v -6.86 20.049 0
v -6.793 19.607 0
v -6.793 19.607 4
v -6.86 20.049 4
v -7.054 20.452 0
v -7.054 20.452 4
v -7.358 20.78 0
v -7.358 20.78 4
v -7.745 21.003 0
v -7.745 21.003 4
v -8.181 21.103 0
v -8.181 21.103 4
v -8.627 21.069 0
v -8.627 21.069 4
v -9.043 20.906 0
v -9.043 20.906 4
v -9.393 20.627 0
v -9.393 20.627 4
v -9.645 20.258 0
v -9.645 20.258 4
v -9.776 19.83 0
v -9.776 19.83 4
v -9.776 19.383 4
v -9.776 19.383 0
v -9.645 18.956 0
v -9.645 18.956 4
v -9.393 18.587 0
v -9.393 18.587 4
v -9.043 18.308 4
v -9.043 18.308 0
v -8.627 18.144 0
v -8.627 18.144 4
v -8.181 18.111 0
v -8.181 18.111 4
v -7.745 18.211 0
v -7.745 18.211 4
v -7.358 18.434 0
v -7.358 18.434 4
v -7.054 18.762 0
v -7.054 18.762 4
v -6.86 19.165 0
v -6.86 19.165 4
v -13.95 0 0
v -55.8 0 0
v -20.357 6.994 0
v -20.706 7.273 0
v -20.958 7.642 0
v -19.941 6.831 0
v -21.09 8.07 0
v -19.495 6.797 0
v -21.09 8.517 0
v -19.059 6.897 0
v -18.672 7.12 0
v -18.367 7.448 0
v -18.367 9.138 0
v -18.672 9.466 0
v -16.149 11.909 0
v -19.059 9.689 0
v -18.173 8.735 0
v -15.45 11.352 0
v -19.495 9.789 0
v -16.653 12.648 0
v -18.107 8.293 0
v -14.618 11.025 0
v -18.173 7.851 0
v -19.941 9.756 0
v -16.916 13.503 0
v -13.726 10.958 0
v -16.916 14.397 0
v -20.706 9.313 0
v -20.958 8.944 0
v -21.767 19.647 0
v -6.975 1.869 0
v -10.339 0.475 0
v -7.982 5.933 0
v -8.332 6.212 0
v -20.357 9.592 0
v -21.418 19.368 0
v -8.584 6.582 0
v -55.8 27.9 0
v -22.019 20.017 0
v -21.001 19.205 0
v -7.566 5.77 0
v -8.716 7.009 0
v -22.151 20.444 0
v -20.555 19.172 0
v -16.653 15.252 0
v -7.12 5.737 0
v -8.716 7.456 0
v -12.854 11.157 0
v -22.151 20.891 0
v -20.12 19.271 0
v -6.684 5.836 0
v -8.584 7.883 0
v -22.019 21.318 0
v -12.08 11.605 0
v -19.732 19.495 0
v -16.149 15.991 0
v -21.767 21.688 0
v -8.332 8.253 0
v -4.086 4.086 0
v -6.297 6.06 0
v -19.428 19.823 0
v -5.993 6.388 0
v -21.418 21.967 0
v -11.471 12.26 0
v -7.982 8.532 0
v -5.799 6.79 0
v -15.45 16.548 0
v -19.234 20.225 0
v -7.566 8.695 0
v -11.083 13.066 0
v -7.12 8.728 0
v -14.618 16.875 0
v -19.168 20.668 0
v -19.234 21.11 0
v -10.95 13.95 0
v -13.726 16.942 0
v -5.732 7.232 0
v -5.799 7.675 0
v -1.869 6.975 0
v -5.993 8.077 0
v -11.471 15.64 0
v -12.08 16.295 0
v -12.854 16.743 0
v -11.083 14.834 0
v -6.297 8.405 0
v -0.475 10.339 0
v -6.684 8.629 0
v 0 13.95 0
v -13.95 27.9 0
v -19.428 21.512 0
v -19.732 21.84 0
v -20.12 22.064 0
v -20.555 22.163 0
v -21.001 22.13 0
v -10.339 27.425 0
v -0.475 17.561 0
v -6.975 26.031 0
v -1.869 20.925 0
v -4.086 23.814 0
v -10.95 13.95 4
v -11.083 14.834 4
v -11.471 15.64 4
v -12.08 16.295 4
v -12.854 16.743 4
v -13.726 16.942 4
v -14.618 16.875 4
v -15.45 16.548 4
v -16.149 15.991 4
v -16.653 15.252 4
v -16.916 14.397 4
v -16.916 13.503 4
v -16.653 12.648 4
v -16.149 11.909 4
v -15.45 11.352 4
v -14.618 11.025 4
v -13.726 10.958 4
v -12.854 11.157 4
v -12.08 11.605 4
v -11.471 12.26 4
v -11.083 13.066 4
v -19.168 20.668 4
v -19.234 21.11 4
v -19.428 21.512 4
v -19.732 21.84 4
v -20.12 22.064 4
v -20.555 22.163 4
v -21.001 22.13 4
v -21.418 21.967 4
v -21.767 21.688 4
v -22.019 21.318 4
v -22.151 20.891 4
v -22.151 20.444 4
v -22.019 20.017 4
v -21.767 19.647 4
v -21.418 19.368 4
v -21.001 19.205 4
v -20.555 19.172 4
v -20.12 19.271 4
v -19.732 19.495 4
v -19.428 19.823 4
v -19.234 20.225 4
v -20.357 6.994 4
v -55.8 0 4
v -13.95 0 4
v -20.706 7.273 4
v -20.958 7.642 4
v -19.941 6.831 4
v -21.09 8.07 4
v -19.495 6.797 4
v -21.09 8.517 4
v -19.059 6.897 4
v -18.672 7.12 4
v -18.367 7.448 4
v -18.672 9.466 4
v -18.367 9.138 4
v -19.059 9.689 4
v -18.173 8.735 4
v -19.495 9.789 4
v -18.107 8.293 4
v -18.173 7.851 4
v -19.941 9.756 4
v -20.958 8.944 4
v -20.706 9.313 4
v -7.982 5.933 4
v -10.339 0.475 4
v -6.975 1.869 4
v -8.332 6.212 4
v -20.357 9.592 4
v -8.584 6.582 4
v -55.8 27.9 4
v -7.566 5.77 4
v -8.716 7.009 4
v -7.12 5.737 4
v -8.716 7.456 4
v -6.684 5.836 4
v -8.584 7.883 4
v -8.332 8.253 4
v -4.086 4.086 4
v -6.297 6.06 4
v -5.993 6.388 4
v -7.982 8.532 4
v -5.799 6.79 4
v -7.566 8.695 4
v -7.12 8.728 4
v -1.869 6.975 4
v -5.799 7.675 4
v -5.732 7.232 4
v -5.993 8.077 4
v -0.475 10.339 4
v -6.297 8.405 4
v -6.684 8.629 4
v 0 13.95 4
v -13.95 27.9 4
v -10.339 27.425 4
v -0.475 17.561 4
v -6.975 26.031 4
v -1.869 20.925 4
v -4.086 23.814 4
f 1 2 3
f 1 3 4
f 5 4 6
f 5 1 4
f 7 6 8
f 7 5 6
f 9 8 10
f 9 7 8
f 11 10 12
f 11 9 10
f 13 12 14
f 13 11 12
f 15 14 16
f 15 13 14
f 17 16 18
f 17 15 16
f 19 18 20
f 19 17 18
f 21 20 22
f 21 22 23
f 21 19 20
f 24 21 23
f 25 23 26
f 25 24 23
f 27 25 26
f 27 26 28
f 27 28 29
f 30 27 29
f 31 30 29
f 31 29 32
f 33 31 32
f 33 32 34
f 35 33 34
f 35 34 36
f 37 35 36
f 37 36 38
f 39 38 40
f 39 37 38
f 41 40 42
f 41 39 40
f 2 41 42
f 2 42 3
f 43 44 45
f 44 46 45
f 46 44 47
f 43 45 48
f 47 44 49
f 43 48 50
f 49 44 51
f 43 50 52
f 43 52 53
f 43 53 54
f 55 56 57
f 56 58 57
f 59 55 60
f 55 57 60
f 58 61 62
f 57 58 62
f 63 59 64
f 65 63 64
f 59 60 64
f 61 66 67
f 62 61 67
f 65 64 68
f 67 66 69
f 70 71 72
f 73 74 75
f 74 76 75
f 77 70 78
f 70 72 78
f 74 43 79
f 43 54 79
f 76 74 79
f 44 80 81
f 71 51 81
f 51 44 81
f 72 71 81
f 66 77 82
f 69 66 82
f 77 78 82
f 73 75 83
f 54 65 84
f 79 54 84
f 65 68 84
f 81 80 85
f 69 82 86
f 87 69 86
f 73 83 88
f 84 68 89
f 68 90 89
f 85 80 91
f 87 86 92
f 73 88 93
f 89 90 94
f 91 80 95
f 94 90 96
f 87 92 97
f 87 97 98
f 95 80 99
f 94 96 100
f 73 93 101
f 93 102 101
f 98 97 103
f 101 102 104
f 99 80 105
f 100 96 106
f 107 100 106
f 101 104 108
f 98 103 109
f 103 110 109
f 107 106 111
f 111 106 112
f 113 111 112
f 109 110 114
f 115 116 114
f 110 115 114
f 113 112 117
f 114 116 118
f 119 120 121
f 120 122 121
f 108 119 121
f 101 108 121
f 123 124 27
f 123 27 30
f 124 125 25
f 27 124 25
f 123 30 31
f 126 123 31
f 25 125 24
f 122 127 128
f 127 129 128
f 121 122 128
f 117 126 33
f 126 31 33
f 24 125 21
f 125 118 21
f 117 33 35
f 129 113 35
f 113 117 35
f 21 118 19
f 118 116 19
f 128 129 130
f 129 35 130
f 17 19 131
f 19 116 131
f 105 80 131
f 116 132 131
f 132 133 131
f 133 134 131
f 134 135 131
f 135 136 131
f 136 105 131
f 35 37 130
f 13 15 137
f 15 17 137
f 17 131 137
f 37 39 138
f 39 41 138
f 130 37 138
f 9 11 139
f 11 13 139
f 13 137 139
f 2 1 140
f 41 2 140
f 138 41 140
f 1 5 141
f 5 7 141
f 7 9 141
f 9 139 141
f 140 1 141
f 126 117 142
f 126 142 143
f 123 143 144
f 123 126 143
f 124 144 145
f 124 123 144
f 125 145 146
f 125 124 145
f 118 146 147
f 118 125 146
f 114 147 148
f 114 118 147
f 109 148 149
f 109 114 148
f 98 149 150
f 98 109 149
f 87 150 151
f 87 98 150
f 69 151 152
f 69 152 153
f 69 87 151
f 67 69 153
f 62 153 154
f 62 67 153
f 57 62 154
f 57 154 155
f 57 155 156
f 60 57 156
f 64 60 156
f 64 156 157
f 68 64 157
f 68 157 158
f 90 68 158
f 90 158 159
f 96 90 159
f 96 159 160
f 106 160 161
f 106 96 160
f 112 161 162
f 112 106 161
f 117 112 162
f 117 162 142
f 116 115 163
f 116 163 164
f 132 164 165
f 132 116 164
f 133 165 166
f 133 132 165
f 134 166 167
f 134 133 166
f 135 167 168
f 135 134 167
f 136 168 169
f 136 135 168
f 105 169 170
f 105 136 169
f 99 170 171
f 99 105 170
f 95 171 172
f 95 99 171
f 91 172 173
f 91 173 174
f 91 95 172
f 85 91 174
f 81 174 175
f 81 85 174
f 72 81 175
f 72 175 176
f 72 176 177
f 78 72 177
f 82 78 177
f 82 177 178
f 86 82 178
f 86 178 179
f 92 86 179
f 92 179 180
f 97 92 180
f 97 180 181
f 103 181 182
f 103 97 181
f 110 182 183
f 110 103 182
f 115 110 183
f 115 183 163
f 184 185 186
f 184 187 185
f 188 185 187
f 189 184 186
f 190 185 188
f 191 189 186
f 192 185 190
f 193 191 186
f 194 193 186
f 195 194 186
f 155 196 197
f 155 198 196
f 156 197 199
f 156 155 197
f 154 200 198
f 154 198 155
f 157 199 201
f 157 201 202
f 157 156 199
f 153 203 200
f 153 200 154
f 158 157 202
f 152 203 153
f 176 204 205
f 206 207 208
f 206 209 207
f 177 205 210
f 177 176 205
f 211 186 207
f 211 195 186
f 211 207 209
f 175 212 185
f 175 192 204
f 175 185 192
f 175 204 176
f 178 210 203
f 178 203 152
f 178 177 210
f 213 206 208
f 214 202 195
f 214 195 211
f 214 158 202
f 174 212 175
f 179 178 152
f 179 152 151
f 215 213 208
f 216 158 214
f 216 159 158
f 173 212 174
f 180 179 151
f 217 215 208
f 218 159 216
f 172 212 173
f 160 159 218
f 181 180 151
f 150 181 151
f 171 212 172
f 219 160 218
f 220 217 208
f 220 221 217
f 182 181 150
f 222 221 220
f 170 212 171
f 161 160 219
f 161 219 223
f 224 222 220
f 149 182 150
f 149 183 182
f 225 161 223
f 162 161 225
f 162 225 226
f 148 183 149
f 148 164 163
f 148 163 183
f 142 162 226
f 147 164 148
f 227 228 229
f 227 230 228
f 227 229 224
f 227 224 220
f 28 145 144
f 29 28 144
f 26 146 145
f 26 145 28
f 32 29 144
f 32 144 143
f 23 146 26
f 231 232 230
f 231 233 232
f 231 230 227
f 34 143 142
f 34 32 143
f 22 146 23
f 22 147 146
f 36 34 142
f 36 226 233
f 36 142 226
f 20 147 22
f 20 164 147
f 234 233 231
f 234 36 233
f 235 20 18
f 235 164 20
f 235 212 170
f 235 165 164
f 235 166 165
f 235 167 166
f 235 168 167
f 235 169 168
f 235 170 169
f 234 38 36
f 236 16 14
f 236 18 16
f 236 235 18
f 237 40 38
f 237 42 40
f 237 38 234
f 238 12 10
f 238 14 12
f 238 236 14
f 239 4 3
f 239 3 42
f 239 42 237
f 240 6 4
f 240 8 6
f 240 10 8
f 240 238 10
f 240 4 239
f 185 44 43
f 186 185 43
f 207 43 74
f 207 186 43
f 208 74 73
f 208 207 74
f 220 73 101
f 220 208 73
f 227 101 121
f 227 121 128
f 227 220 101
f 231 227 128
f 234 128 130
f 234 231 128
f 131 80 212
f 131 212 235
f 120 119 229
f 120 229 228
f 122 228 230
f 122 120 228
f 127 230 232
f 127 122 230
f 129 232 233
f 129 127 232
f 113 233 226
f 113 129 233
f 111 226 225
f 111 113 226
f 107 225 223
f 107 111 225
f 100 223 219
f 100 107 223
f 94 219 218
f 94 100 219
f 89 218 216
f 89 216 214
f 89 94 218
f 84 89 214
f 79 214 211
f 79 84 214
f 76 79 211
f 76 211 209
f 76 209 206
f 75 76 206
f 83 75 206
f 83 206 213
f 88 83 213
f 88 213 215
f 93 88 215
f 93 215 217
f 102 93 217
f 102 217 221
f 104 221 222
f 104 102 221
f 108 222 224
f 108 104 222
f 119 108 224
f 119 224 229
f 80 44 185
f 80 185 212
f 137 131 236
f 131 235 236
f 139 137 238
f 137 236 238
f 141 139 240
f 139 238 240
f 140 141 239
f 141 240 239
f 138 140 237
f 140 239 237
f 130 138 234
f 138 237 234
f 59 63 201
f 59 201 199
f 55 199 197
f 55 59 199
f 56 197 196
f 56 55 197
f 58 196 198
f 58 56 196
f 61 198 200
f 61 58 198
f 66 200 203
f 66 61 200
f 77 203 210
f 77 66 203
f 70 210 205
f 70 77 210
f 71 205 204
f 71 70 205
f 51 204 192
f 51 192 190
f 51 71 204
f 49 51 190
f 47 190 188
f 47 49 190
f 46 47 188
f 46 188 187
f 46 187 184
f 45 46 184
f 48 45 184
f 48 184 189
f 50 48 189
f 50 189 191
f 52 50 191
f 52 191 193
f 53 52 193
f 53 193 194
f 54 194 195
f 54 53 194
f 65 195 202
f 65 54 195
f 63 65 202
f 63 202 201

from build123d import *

# Parameters (mm, degrees)
F0_W     = 55.8
F0_H     = 27.9
F0_R     = 1.5
F0_R_2   = 3
F1_DEPTH = 4
F2_R     = 13.94999


# Not quite as in the source:
# - a fillet or chamfer is up to 0.001 mm smaller than in the source, because OpenCascade refuses the exact size


with BuildPart() as f1:
    # F0 (on Top) → F1 (new body)
    with BuildSketch(Plane.XY):
        with Locations((-27.9, 13.95)):
            Rectangle(F0_W, F0_H)
        with Locations((-19.6068542495, 8.2931457505)):
            Circle(F0_R, mode=Mode.SUBTRACT)
        with Locations((-7.2324855787, 7.2324855787)):
            Circle(F0_R, mode=Mode.SUBTRACT)
        with Locations((-20.6675144213, 20.6675144213)):
            Circle(F0_R, mode=Mode.SUBTRACT)
        with Locations((-13.95, 13.95)):
            Circle(F0_R_2, mode=Mode.SUBTRACT)
        with Locations((-8.2931457505, 19.6068542495)):
            Circle(F0_R, mode=Mode.SUBTRACT)
    extrude(amount=F1_DEPTH)

    # F2 (radius 13.95 in the source; OpenCascade refuses exactly that, so slightly less here)
    f2_edges = [f1.edges().sort_by_distance(p)[0] for p in [
        (0, 27.9, 2),
        (0, 0, 2),
    ]]
    fillet(f2_edges, radius=F2_R)


solid = f1.part
